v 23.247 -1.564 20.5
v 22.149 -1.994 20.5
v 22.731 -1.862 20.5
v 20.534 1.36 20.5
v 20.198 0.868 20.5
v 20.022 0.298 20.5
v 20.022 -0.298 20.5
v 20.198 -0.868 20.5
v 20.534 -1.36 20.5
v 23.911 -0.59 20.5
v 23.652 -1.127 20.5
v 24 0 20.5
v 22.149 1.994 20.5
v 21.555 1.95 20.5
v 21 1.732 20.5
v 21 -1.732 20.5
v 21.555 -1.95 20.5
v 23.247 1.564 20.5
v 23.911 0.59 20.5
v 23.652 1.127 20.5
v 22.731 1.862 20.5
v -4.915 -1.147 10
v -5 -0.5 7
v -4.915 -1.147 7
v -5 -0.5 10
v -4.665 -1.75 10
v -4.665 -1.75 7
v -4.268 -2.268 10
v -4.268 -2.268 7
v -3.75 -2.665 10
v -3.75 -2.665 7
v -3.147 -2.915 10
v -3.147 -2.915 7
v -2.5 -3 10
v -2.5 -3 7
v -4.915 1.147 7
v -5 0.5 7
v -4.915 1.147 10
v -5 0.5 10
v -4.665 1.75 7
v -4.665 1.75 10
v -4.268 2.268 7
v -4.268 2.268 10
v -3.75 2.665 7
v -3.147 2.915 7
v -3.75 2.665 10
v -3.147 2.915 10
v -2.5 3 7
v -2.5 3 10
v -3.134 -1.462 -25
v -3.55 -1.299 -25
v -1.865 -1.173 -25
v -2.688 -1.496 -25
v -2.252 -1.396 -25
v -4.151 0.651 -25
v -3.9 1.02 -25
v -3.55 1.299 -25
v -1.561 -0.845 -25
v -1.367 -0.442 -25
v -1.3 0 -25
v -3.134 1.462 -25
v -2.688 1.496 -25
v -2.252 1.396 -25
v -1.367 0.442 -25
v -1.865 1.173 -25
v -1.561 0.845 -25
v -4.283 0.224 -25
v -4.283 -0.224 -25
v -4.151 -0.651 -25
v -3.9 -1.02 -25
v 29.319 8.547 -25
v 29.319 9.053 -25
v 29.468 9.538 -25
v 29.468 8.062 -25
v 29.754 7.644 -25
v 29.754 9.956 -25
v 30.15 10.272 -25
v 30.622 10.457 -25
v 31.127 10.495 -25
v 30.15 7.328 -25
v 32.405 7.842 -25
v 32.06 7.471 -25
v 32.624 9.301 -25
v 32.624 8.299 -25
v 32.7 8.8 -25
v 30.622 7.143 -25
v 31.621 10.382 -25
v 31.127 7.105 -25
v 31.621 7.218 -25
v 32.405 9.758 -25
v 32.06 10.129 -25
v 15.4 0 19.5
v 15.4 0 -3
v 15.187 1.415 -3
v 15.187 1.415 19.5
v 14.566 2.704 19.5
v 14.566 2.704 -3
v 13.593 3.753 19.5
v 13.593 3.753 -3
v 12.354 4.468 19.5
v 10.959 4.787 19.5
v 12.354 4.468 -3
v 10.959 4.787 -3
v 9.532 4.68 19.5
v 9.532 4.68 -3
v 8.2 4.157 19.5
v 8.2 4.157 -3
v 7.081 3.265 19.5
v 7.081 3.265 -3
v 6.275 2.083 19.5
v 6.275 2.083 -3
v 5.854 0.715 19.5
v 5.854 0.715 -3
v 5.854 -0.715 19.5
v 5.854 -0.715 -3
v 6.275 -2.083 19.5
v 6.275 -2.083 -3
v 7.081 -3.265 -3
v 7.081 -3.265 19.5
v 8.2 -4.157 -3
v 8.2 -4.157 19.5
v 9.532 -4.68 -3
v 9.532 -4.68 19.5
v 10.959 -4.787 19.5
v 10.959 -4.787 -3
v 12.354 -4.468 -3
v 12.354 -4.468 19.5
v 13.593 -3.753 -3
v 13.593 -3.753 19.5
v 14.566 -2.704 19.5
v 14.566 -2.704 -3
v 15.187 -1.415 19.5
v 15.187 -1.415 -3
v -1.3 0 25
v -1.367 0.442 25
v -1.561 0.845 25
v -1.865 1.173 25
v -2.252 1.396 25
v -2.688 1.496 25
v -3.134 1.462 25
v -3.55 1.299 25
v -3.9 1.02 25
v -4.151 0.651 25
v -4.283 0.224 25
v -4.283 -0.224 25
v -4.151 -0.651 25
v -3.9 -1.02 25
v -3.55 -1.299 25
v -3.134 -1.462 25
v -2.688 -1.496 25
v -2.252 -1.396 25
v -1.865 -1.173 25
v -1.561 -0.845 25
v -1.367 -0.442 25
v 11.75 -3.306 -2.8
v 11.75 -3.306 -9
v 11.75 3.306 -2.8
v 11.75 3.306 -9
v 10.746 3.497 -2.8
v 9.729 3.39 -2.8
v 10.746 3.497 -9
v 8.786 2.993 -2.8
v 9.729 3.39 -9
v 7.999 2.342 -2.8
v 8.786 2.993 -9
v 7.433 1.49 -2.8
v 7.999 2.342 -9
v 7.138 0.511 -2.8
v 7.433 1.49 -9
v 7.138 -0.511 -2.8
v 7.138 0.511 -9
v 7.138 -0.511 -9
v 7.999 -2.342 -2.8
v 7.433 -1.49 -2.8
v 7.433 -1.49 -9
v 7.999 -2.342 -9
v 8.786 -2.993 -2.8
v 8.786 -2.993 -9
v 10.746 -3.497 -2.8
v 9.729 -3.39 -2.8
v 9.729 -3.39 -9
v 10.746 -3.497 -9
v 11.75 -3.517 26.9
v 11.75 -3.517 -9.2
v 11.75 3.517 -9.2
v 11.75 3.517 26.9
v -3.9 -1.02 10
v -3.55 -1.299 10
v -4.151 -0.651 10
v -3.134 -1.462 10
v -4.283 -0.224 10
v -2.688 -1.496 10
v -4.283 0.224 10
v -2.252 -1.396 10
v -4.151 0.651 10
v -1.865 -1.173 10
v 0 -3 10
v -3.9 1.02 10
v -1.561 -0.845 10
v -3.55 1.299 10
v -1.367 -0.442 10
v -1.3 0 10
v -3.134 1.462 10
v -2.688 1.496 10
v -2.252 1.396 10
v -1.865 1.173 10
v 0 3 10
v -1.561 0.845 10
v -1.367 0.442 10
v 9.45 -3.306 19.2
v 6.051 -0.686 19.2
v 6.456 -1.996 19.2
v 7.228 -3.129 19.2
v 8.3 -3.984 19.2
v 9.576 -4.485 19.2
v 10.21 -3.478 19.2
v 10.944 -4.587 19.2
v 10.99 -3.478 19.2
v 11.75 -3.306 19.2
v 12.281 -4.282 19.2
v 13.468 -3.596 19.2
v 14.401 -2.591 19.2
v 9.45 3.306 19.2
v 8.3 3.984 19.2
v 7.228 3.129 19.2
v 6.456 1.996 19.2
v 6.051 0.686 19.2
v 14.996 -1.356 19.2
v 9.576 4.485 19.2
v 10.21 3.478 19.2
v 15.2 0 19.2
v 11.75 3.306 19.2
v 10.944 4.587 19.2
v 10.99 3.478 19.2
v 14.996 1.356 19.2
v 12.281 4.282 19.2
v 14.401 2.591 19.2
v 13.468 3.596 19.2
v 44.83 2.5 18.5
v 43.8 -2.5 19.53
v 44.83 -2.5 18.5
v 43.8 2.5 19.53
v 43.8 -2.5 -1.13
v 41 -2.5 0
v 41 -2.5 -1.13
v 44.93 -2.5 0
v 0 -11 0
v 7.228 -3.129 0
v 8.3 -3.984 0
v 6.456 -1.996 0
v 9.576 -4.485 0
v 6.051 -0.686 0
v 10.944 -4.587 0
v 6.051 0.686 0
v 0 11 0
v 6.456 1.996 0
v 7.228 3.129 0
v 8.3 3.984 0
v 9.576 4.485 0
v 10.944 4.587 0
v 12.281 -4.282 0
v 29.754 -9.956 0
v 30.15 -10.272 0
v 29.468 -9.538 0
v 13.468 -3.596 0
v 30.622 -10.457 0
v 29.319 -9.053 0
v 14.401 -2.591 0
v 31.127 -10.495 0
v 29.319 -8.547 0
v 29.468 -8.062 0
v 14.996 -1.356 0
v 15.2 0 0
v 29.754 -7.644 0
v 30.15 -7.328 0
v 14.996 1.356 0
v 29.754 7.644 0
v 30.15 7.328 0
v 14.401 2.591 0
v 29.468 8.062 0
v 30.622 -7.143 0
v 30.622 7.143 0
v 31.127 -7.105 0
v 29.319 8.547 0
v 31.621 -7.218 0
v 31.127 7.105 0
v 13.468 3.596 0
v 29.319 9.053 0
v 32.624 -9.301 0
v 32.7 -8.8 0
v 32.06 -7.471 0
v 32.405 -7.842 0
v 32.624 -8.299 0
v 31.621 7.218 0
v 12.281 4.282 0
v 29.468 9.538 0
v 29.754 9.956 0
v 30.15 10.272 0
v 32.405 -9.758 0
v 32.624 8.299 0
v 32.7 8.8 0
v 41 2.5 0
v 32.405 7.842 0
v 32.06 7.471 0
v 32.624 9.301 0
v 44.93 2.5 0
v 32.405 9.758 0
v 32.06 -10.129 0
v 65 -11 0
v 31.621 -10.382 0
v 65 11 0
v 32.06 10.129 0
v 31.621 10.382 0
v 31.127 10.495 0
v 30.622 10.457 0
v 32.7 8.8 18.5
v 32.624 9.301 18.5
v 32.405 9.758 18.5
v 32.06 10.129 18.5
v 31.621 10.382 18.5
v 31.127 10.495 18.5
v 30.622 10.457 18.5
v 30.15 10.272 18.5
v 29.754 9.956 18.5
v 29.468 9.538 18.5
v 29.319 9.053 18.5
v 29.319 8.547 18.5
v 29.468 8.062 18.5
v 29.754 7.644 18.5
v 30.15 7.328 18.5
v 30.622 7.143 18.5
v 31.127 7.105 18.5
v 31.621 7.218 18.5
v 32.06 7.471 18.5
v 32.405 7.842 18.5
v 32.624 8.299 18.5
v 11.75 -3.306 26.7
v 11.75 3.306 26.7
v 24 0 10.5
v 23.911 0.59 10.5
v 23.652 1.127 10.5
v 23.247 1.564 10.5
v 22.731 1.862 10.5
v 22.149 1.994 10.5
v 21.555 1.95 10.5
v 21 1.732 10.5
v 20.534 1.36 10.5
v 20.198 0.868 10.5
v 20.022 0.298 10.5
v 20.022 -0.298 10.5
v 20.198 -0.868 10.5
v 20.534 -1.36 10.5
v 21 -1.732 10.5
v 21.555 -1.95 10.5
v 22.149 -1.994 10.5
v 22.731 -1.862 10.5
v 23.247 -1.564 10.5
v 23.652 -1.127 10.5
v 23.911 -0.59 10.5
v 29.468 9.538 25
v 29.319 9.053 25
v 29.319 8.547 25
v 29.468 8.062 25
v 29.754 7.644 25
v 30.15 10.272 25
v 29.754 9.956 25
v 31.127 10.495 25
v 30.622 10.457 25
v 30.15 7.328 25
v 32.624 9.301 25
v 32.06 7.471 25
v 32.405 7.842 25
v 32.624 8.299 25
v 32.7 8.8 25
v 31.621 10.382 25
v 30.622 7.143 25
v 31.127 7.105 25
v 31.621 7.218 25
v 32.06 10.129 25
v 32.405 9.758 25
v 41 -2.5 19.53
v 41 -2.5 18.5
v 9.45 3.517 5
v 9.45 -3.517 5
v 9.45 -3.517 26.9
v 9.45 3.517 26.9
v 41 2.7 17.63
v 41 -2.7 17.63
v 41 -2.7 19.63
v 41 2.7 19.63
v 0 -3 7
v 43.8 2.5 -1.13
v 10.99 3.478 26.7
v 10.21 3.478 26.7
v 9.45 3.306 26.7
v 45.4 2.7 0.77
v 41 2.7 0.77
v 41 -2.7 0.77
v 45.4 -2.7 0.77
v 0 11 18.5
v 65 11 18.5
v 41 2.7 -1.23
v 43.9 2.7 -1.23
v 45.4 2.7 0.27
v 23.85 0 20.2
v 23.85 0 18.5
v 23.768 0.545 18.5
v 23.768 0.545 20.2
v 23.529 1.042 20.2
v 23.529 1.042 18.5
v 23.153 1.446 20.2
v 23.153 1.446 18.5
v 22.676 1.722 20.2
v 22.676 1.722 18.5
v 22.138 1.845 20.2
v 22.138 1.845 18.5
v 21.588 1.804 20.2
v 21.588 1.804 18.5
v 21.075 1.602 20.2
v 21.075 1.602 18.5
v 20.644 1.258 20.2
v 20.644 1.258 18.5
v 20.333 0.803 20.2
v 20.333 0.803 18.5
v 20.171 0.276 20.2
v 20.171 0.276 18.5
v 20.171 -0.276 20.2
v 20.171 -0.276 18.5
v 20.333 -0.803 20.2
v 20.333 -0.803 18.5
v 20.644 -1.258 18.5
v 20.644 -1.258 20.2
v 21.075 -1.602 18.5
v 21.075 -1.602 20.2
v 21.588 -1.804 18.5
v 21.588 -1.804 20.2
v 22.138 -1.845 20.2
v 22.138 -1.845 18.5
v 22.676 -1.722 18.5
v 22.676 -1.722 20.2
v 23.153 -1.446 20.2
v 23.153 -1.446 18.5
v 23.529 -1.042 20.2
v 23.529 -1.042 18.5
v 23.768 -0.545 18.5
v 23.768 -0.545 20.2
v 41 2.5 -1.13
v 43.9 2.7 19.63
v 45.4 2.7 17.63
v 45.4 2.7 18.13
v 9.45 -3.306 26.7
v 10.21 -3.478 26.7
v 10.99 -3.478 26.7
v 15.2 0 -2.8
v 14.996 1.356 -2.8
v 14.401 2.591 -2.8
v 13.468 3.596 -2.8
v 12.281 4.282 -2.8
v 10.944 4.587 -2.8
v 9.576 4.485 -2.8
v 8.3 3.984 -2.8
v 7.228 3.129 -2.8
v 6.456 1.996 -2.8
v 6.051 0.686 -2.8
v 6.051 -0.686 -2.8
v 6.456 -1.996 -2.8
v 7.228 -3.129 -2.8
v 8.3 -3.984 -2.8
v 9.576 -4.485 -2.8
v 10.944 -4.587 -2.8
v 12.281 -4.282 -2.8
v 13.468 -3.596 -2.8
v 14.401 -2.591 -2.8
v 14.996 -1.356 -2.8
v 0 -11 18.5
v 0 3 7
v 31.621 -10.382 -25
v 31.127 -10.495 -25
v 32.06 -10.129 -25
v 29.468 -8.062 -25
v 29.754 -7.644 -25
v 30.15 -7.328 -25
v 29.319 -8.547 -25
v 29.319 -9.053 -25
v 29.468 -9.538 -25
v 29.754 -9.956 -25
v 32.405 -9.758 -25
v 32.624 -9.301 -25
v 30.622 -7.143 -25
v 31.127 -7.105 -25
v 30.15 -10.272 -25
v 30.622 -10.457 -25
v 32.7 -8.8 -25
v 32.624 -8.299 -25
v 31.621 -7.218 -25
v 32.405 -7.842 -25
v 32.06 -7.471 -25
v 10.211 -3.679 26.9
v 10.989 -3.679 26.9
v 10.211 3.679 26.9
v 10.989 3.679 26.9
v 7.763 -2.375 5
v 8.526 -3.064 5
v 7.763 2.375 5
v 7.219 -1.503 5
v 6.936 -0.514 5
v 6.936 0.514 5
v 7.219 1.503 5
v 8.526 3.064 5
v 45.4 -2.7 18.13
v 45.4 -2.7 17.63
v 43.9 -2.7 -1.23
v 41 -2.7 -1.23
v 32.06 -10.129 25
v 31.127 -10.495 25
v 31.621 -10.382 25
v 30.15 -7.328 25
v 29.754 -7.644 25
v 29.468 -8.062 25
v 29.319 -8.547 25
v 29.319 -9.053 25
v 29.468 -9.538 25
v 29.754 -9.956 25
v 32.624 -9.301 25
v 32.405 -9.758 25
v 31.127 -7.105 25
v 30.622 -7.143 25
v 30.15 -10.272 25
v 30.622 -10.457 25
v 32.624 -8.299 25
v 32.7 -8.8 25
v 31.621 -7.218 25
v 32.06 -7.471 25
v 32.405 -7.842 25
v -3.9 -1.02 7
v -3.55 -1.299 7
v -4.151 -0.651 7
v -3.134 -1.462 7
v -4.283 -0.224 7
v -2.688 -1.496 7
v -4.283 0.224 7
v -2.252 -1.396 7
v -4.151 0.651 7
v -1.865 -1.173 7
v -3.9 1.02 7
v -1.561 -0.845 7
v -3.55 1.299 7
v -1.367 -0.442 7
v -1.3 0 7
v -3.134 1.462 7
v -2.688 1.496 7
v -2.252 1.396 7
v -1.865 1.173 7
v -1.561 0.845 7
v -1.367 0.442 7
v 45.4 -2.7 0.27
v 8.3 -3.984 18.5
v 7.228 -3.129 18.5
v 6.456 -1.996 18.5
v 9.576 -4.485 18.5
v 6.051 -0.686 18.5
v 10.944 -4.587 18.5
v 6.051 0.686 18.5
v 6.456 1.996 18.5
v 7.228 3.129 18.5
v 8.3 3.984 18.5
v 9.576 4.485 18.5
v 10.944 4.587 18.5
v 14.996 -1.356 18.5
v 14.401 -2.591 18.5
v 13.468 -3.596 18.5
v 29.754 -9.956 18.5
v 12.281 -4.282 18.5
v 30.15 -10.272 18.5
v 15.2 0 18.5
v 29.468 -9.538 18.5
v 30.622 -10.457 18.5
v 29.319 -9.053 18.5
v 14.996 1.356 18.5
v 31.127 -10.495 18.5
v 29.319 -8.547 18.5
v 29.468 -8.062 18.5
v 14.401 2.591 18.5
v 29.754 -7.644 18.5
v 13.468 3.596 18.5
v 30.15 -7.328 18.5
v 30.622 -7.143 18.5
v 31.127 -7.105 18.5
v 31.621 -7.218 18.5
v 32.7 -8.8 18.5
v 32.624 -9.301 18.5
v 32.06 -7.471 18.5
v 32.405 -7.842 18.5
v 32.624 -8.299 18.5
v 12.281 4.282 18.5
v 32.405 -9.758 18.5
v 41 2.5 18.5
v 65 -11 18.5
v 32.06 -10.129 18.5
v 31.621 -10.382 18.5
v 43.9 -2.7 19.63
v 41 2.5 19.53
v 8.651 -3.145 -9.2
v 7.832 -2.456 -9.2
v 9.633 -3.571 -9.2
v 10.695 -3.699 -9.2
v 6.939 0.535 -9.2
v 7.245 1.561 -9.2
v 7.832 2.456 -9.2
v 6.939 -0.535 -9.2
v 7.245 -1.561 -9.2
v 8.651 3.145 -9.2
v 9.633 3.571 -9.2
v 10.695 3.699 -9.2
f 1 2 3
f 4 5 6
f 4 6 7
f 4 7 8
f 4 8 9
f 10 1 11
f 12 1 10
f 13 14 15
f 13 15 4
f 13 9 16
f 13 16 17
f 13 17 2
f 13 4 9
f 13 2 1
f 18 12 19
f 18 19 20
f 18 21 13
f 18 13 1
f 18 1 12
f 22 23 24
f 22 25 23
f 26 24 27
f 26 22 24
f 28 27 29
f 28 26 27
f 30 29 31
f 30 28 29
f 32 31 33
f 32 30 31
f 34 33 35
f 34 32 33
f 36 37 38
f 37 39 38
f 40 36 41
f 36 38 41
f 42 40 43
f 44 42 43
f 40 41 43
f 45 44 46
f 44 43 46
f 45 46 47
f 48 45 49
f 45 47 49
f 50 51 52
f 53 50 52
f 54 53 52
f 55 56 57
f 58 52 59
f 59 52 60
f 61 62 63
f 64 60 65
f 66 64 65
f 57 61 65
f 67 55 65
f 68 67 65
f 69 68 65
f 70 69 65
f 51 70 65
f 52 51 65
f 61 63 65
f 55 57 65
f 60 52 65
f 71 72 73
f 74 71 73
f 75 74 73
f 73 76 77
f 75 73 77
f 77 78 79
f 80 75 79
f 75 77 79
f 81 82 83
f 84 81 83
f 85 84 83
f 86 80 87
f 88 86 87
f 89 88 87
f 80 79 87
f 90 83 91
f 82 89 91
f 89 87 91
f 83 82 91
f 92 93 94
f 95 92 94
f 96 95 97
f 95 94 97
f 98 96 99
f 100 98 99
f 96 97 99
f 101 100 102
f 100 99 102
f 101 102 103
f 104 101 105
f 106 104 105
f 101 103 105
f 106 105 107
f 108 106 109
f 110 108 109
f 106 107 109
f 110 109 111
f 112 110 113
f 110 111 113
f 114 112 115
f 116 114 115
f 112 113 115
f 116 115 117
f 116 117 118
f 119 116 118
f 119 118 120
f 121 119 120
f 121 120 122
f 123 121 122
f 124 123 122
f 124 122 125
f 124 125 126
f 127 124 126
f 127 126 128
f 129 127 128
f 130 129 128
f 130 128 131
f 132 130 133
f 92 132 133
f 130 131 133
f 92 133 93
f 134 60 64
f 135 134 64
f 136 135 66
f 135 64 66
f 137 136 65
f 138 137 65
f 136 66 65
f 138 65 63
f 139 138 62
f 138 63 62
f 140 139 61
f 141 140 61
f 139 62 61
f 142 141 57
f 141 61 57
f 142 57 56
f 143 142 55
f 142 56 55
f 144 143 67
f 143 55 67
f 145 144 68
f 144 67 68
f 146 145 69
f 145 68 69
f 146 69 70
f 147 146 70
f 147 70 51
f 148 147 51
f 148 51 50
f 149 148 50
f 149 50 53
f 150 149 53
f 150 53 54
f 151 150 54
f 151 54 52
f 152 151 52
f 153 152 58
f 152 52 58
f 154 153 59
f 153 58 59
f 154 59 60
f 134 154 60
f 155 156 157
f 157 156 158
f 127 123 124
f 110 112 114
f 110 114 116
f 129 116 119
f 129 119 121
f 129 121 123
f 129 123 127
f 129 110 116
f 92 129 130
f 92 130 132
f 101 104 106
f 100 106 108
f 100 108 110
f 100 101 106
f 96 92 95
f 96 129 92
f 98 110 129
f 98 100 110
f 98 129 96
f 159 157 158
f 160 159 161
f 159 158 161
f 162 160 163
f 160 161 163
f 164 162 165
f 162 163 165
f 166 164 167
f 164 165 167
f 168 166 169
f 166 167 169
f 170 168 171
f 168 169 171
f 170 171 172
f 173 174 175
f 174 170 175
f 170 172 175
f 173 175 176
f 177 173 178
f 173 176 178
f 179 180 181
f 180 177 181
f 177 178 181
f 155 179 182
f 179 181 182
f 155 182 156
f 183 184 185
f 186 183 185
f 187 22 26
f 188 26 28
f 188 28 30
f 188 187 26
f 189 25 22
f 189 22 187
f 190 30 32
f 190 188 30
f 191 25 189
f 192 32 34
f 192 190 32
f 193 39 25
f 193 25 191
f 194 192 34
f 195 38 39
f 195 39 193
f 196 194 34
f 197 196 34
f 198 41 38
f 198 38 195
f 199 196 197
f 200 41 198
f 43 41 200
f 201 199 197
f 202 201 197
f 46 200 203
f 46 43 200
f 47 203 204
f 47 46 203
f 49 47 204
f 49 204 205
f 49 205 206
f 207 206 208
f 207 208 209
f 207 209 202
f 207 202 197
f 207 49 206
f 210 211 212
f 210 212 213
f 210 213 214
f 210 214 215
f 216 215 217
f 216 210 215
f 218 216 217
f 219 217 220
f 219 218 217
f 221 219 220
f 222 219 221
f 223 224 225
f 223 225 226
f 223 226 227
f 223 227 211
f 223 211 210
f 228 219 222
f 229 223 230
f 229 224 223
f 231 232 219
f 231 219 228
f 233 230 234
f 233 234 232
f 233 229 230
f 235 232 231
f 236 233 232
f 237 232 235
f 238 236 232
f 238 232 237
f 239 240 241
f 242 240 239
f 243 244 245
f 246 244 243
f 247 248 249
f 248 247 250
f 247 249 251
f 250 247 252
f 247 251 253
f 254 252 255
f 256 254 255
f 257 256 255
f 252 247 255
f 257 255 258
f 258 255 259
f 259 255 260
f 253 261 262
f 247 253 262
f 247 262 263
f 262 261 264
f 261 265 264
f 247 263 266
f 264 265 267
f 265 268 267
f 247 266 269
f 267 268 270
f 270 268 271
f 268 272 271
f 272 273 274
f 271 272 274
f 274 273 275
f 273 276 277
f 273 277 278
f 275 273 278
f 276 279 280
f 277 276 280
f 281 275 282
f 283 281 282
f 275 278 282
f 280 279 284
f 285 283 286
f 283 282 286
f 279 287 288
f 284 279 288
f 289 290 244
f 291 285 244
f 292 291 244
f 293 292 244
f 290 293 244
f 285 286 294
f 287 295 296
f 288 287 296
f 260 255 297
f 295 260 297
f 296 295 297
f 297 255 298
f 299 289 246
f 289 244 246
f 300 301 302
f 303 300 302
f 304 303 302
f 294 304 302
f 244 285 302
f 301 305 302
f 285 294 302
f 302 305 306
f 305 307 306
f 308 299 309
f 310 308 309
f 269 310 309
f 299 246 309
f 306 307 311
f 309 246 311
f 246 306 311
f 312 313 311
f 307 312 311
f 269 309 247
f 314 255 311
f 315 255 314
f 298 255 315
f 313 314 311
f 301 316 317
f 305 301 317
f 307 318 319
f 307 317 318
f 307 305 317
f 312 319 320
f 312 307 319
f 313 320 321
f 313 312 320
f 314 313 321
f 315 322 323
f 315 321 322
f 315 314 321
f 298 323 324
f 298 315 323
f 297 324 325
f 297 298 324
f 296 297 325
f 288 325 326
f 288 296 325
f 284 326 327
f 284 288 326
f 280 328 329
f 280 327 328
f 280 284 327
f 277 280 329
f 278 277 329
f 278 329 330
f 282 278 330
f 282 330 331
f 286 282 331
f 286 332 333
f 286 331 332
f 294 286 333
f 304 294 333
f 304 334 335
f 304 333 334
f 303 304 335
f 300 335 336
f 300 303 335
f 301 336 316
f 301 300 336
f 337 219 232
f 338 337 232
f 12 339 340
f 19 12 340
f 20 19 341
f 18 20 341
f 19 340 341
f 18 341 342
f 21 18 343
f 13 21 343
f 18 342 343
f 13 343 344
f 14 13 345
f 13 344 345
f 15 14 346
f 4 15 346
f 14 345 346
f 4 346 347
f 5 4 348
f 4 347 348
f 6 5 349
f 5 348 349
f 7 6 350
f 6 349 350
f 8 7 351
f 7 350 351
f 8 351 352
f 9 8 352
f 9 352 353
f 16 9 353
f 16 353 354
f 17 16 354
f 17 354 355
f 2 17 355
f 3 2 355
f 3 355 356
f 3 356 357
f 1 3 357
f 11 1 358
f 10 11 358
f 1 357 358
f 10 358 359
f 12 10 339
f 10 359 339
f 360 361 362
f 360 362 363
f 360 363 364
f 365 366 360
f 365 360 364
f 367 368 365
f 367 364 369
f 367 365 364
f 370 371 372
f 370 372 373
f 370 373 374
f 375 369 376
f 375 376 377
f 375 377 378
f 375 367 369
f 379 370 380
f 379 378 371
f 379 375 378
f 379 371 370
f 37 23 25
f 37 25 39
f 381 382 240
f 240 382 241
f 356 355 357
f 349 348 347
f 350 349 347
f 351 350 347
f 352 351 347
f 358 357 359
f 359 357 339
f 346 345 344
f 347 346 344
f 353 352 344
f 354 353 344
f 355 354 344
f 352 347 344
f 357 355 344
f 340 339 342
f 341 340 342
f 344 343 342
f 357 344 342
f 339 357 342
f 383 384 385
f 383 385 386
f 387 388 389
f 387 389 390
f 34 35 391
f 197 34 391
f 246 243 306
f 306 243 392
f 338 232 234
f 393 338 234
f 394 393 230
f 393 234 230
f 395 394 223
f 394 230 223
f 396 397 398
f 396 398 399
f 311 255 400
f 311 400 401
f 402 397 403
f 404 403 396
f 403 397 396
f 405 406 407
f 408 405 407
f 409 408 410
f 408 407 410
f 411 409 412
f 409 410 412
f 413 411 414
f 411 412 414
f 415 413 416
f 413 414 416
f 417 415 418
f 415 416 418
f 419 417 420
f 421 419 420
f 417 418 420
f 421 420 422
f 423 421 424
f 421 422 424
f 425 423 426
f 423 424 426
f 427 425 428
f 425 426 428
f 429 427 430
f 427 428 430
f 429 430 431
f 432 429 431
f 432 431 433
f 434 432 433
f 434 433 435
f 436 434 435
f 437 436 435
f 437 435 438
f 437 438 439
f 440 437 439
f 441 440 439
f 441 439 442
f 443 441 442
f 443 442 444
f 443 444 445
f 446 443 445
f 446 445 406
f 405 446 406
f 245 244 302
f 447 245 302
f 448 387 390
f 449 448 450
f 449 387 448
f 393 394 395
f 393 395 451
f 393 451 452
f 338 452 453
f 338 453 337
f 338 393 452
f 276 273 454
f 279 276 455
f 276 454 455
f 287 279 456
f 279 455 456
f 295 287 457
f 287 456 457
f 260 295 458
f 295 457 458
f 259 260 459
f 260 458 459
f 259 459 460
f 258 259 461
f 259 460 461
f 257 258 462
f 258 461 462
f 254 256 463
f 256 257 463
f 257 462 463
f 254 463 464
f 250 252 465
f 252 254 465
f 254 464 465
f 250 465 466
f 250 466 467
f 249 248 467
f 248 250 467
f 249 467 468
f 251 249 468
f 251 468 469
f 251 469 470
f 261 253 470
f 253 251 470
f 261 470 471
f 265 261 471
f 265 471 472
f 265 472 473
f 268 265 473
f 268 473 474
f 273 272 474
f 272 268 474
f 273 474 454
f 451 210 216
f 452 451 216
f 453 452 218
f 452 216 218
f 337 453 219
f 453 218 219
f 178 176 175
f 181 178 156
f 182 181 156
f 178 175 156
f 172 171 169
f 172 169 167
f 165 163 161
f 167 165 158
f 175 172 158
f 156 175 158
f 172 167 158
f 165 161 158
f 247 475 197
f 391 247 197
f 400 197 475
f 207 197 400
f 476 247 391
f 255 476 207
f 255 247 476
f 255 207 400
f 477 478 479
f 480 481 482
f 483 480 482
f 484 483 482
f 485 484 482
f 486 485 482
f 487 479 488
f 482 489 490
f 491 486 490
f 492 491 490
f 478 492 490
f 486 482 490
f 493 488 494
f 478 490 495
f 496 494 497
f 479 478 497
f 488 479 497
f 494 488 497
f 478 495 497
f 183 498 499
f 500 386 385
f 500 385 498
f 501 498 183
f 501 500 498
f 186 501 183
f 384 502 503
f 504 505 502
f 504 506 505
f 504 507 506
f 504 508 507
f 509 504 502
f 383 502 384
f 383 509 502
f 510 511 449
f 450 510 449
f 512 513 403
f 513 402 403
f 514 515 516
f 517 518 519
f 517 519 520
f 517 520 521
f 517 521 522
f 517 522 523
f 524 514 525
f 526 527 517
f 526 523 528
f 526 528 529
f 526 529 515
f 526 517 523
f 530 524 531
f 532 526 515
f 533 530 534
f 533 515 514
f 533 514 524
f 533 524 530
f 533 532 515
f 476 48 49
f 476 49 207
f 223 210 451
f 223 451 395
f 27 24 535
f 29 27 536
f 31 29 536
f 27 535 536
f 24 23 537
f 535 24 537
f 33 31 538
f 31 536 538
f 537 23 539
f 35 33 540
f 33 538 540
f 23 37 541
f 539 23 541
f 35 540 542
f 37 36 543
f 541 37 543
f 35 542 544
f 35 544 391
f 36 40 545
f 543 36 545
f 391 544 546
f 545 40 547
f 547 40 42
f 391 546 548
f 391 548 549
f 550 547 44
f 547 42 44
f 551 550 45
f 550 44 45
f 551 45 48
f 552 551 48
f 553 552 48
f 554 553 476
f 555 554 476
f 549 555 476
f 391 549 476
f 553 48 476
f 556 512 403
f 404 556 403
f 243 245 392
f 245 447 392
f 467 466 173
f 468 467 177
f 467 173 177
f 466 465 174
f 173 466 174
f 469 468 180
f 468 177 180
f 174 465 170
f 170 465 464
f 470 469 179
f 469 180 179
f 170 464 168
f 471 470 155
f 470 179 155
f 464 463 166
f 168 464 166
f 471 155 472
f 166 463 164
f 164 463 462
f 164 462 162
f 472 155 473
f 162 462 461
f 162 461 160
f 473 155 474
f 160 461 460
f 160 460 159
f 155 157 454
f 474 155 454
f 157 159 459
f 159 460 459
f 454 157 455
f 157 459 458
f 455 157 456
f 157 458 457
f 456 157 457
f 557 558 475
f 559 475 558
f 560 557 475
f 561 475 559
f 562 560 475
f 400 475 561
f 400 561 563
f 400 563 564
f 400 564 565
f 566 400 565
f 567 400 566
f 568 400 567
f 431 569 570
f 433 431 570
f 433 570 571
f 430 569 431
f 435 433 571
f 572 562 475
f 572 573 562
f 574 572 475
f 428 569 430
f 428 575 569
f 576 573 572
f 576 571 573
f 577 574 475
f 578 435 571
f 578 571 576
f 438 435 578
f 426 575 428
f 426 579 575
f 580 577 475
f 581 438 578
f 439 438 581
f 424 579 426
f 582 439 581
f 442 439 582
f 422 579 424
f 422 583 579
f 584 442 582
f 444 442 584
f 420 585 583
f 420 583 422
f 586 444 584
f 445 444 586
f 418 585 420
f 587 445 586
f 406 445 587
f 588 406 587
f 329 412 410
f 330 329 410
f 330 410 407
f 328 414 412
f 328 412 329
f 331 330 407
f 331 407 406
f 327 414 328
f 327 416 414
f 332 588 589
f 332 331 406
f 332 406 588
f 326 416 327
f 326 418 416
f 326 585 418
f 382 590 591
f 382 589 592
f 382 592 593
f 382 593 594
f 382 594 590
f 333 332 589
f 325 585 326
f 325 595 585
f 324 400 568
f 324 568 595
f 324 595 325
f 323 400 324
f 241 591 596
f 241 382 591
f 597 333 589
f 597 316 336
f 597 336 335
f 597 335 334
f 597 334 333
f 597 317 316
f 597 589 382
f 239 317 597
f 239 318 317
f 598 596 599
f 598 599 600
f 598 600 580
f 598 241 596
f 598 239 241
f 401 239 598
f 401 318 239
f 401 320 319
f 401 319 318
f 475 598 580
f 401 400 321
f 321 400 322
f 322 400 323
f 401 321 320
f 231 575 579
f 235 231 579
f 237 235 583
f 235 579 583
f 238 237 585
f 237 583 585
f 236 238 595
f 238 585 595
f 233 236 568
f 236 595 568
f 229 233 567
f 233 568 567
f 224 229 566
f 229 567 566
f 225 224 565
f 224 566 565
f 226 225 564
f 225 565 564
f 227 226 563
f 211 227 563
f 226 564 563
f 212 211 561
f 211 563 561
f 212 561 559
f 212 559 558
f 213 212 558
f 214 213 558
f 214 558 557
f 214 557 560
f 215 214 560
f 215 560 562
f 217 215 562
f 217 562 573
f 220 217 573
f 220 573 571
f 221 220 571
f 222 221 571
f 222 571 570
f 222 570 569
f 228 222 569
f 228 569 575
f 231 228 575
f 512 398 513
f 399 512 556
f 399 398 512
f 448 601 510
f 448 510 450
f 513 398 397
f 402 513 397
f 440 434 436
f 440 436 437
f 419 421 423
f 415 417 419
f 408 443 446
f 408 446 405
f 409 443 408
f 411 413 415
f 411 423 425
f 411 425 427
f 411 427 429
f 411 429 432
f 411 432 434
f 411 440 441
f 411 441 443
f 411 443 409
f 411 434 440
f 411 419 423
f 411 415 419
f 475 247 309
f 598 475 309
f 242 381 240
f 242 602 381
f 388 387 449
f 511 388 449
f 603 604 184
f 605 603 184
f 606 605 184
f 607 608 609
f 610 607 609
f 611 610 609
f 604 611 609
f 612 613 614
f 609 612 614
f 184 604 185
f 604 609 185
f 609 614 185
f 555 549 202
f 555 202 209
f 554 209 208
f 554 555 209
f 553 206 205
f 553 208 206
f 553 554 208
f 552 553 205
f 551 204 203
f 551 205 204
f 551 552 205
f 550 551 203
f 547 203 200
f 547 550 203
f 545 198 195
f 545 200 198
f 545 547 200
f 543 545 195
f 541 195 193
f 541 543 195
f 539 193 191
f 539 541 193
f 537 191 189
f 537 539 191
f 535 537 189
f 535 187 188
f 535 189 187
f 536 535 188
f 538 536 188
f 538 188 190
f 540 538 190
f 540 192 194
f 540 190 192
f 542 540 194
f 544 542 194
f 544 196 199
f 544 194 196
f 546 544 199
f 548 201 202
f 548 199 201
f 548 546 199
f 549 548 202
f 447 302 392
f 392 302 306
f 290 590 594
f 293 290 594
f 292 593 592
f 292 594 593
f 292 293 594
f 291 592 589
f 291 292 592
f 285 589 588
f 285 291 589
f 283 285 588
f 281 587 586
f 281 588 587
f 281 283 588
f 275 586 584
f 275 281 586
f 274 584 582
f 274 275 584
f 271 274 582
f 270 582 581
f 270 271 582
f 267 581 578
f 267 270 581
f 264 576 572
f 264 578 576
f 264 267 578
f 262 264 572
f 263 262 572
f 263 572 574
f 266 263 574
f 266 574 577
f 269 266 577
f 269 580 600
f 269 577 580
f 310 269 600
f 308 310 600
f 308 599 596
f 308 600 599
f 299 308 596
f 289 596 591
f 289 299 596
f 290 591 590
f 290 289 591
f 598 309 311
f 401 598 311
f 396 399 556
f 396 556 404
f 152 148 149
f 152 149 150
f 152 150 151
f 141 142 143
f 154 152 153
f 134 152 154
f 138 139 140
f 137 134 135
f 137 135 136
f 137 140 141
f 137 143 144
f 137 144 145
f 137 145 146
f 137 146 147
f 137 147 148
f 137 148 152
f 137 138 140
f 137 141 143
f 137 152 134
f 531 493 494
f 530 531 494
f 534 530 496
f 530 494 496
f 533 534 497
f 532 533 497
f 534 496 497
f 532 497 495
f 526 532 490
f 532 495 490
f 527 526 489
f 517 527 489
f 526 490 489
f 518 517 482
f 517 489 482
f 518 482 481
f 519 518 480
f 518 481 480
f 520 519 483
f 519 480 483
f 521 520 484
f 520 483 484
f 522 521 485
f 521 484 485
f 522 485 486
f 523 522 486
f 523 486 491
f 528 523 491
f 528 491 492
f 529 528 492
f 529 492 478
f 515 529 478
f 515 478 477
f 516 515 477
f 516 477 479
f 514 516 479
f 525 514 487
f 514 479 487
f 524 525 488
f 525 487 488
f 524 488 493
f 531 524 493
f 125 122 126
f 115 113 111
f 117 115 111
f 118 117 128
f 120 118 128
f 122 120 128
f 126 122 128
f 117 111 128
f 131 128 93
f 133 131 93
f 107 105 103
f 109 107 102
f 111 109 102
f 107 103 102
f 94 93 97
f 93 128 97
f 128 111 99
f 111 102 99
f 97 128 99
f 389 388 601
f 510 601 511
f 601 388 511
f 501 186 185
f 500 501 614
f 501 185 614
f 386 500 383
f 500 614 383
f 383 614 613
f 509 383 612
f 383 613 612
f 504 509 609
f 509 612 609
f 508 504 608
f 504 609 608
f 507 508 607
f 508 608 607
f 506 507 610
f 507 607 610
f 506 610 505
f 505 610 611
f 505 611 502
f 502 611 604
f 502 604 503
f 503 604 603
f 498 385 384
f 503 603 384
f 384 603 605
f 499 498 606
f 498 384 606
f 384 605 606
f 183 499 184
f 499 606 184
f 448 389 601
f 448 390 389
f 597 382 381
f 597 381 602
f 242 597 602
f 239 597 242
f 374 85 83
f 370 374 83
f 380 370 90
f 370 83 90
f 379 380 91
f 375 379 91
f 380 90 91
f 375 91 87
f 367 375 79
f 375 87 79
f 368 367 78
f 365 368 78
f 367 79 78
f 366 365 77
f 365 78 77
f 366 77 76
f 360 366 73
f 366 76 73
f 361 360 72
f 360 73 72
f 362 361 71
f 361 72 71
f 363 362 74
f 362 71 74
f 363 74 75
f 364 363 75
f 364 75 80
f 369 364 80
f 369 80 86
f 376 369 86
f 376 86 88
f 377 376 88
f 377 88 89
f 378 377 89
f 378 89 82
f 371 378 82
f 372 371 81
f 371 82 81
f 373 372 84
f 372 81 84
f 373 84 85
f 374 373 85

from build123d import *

# Parameters (mm, degrees)
CYLINDER001_R     = 1.5
CYLINDER001_DEPTH = 50
CYLINDER004_R     = 1.7
CYLINDER004_DEPTH = 50
CYLINDER005_R     = 1.7
CYLINDER005_DEPTH = 50
CYLINDER007_R     = 2
CYLINDER007_DEPTH = 10
CYLINDER009_R     = 4.8
CYLINDER009_DEPTH = 22.5
BOX005_W          = 10
BOX005_H          = 10
BOX005_DEPTH      = 40
BOX004_W          = 10
BOX004_H          = 10
BOX004_DEPTH      = 40
CYLINDER011_R     = 3.7
CYLINDER011_DEPTH = 36.1
BOX009_W          = 4.4
BOX009_H          = 5.4
BOX009_DEPTH      = 2
CHAMFER003_SIZE   = 1.5
BOX008_W          = 4.4
BOX008_H          = 5.4
BOX008_DEPTH      = 2
CHAMFER002_SIZE   = 1.5
BOX007_W          = 4.3
BOX007_H          = 5
BOX007_DEPTH      = 2
CHAMFER001_SIZE   = 1.5
BOX006_W          = 4.3
BOX006_H          = 5
BOX006_DEPTH      = 2
CHAMFER_SIZE      = 1.5
BOX003_W          = 10
BOX003_H          = 10
BOX003_DEPTH      = 40
BOX002_W          = 10
BOX002_H          = 10
BOX002_DEPTH      = 40
CYLINDER010_R     = 3.5
CYLINDER010_DEPTH = 35.7
CYLINDER008_R     = 4.6
CYLINDER008_DEPTH = 22
CYLINDER006_R     = 1.85
CYLINDER006_DEPTH = 10
CYLINDER003_R     = 1.7
CYLINDER003_DEPTH = 50
CYLINDER002_R     = 1.7
CYLINDER002_DEPTH = 50
CYLINDER_R        = 1.5
CYLINDER_DEPTH    = 10
BOX001_W          = 10
BOX001_H          = 6
BOX001_DEPTH      = 3
FILLET_R          = 2.5
FILLET001_R       = 2.5
BOX_W             = 65
BOX_H             = 22
BOX_DEPTH         = 18.5


with BuildPart() as endhole:
    # Cylinder001 → Cylinder001 (new body)
    with BuildSketch(Plane(origin=(-2.8, 0, -25), x_dir=(1, 0, 0), z_dir=(0, 0, 1))):
        Circle(CYLINDER001_R)
    extrude(amount=CYLINDER001_DEPTH)


with BuildPart() as cylinder004:
    # Cylinder004 → Cylinder004 (new body)
    with BuildSketch(Plane(origin=(31, 8.8, -25), x_dir=(1, 0, 0), z_dir=(0, 0, 1))):
        Circle(CYLINDER004_R)
    extrude(amount=CYLINDER004_DEPTH)


with BuildPart() as cylinder005:
    # Cylinder005 → Cylinder005 (new body)
    with BuildSketch(Plane(origin=(31, -8.8, -25), x_dir=(1, 0, 0), z_dir=(0, 0, 1))):
        Circle(CYLINDER005_R)
    extrude(amount=CYLINDER005_DEPTH)


with BuildPart() as central_bump:
    # Cylinder007 → Cylinder007 (new body)
    with BuildSketch(Plane(origin=(22, 0, 10.5), x_dir=(1, 0, 0), z_dir=(0, 0, 1))):
        Circle(CYLINDER007_R)
    extrude(amount=CYLINDER007_DEPTH)


with BuildPart() as motor_boss:
    # Cylinder009 → Cylinder009 (new body)
    with BuildSketch(Plane(origin=(10.6, 0, -3), x_dir=(1, 0, 0), z_dir=(0, 0, 1))):
        Circle(CYLINDER009_R)
    extrude(amount=CYLINDER009_DEPTH)


with BuildPart() as cube005:
    # Box005 → Box005 (new body)
    with BuildSketch(Plane(origin=(-0.55, -5, 5), x_dir=(1, 0, 0), z_dir=(0, 0, 1))):
        with Locations((5, 5)):
            Rectangle(BOX005_W, BOX005_H)
    extrude(amount=BOX005_DEPTH)


with BuildPart() as cube004:
    # Box004 → Box004 (new body)
    with BuildSketch(Plane(origin=(11.75, -5, -11), x_dir=(1, 0, 0), z_dir=(0, 0, 1))):
        with Locations((5, 5)):
            Rectangle(BOX004_W, BOX004_H)
    extrude(amount=BOX004_DEPTH)


with BuildPart() as drive:
    # Cylinder011 → Cylinder011 (new body)
    with BuildSketch(Plane(origin=(10.6, 0, -9.2), x_dir=(1, 0, 0), z_dir=(0, 0, 1))):
        Circle(CYLINDER011_R)
    extrude(amount=CYLINDER011_DEPTH)

    # Cut005: cut Cube004
    add(cube004.part, mode=Mode.SUBTRACT)

    # Cut006: cut Cube005
    add(cube005.part, mode=Mode.SUBTRACT)


with BuildPart() as chamfer003:
    # Box009 → Box009 (new body)
    with BuildSketch(Plane(origin=(41, -2.7, 17.63), x_dir=(1, 0, 0), z_dir=(0, 0, 1))):
        with Locations((2.2, 2.7)):
            Rectangle(BOX009_W, BOX009_H)
    extrude(amount=BOX009_DEPTH)

    # Chamfer003
    chamfer003_edges = [chamfer003.edges().sort_by_distance(p)[0] for p in [
        (45.4, 0, 19.63),
    ]]
    chamfer(chamfer003_edges, length=CHAMFER003_SIZE)


with BuildPart() as part_mirroring001:
    # Part__Mirroring001: instance of Chamfer003
    add(chamfer003.part.mirror(Plane(origin=(0, 0, 0), x_dir=(0, 1, 0), z_dir=(0, 0, 1))))


with BuildPart() as part_mirroring001_1:
    # Part__Mirroring001 placement: moved
    add(part_mirroring001.part.moved(Location((0, 0, 18.4))))


with BuildPart() as hook_bumps:
    # Box008 → Box008 (new body)
    with BuildSketch(Plane(origin=(41, -2.7, 17.63), x_dir=(1, 0, 0), z_dir=(0, 0, 1))):
        with Locations((2.2, 2.7)):
            Rectangle(BOX008_W, BOX008_H)
    extrude(amount=BOX008_DEPTH)

    # Chamfer002
    chamfer002_edges = [hook_bumps.edges().sort_by_distance(p)[0] for p in [
        (45.4, 0, 19.63),
    ]]
    chamfer(chamfer002_edges, length=CHAMFER002_SIZE)

    # Fusion005: union Part__Mirroring001
    add(part_mirroring001_1.part)


with BuildPart() as chamfer001:
    # Box007 → Box007 (new body)
    with BuildSketch(Plane(origin=(41, -2.5, 17.53), x_dir=(1, 0, 0), z_dir=(0, 0, 1))):
        with Locations((2.15, 2.5)):
            Rectangle(BOX007_W, BOX007_H)
    extrude(amount=BOX007_DEPTH)

    # Chamfer001
    chamfer001_edges = [chamfer001.edges().sort_by_distance(p)[0] for p in [
        (45.3, 0, 19.53),
    ]]
    chamfer(chamfer001_edges, length=CHAMFER001_SIZE)


with BuildPart() as part_mirroring:
    # Part__Mirroring: instance of Chamfer001
    add(chamfer001.part.mirror(Plane(origin=(0, 0, 0), x_dir=(0, 1, 0), z_dir=(0, 0, 1))))


with BuildPart() as part_mirroring_1:
    # Part__Mirroring placement: moved
    add(part_mirroring.part.moved(Location((0, 0, 18.4))))


with BuildPart() as fusion004:
    # Box006 → Box006 (new body)
    with BuildSketch(Plane(origin=(41, -2.5, 17.53), x_dir=(1, 0, 0), z_dir=(0, 0, 1))):
        with Locations((2.15, 2.5)):
            Rectangle(BOX006_W, BOX006_H)
    extrude(amount=BOX006_DEPTH)

    # Chamfer
    chamfer_edges = [fusion004.edges().sort_by_distance(p)[0] for p in [
        (45.3, 0, 19.53),
    ]]
    chamfer(chamfer_edges, length=CHAMFER_SIZE)

    # Fusion004: union Part__Mirroring
    add(part_mirroring_1.part)


with BuildPart() as cube003:
    # Box003 → Box003 (new body)
    with BuildSketch(Plane(origin=(-0.55, -5, 5), x_dir=(1, 0, 0), z_dir=(0, 0, 1))):
        with Locations((5, 5)):
            Rectangle(BOX003_W, BOX003_H)
    extrude(amount=BOX003_DEPTH)


with BuildPart() as cube002:
    # Box002 → Box002 (new body)
    with BuildSketch(Plane(origin=(11.75, -5, -11), x_dir=(1, 0, 0), z_dir=(0, 0, 1))):
        with Locations((5, 5)):
            Rectangle(BOX002_W, BOX002_H)
    extrude(amount=BOX002_DEPTH)


with BuildPart() as cut004:
    # Cylinder010 → Cylinder010 (new body)
    with BuildSketch(Plane(origin=(10.6, 0, -9), x_dir=(1, 0, 0), z_dir=(0, 0, 1))):
        Circle(CYLINDER010_R)
    extrude(amount=CYLINDER010_DEPTH)

    # Cut003: cut Cube002
    add(cube002.part, mode=Mode.SUBTRACT)

    # Cut004: cut Cube003
    add(cube003.part, mode=Mode.SUBTRACT)


with BuildPart() as cylinder008:
    # Cylinder008 → Cylinder008 (new body)
    with BuildSketch(Plane(origin=(10.6, 0, -2.8), x_dir=(1, 0, 0), z_dir=(0, 0, 1))):
        Circle(CYLINDER008_R)
    extrude(amount=CYLINDER008_DEPTH)


with BuildPart() as cylinder003:
    # Cylinder006 → Cylinder006 (new body)
    with BuildSketch(Plane(origin=(22, 0, 10.2), x_dir=(1, 0, 0), z_dir=(0, 0, 1))):
        Circle(CYLINDER006_R)
    extrude(amount=CYLINDER006_DEPTH)


with BuildPart() as cylinder002:
    # Cylinder003 → Cylinder003 (new body)
    with BuildSketch(Plane(origin=(31, -8.8, -25), x_dir=(1, 0, 0), z_dir=(0, 0, 1))):
        Circle(CYLINDER003_R)
    extrude(amount=CYLINDER003_DEPTH)


with BuildPart() as cylinder001:
    # Cylinder002 → Cylinder002 (new body)
    with BuildSketch(Plane(origin=(31, 8.8, -25), x_dir=(1, 0, 0), z_dir=(0, 0, 1))):
        Circle(CYLINDER002_R)
    extrude(amount=CYLINDER002_DEPTH)


with BuildPart() as cylinder:
    # Cylinder → Cylinder (new body)
    with BuildSketch(Plane(origin=(-2.8, 0, 3), x_dir=(1, 0, 0), z_dir=(0, 0, 1))):
        Circle(CYLINDER_R)
    extrude(amount=CYLINDER_DEPTH)


with BuildPart() as fillet001:
    # Box001 → Box001 (new body)
    with BuildSketch(Plane(origin=(-5, -3, 7), x_dir=(1, 0, 0), z_dir=(0, 0, 1))):
        with Locations((5, 3)):
            Rectangle(BOX001_W, BOX001_H)
    extrude(amount=BOX001_DEPTH)

    # Cut: cut Cylinder
    add(cylinder.part, mode=Mode.SUBTRACT)

    # Fillet
    fillet_edges = [fillet001.edges().sort_by_distance(p)[0] for p in [
        (-5, -3, 8.5),
    ]]
    fillet(fillet_edges, radius=FILLET_R)

    # Fillet001
    fillet001_edges = [fillet001.edges().sort_by_distance(p)[0] for p in [
        (-5, 3, 8.5),
    ]]
    fillet(fillet001_edges, radius=FILLET001_R)


with BuildPart() as fusion006:
    # Box → Box (new body)
    with BuildSketch(Plane(origin=(0, -11, 0), x_dir=(1, 0, 0), z_dir=(0, 0, 1))):
        with Locations((32.5, 11)):
            Rectangle(BOX_W, BOX_H)
    extrude(amount=BOX_DEPTH)

    # Fusion: union Fillet001
    add(fillet001.part)

    # Cut001: cut Cylinder001
    add(cylinder001.part, mode=Mode.SUBTRACT)

    # Cut002: cut Cylinder002
    add(cylinder002.part, mode=Mode.SUBTRACT)

    # Fusion001: union Cylinder003
    add(cylinder003.part)

    # Fusion002: union Cylinder008
    add(cylinder008.part)

    # Fusion003: union Cut004
    add(cut004.part)

    # Fusion006: union Fusion004
    add(fusion004.part)


solid = Compound([endhole.part, cylinder004.part, cylinder005.part, central_bump.part, motor_boss.part, drive.part, hook_bumps.part, fusion006.part])
